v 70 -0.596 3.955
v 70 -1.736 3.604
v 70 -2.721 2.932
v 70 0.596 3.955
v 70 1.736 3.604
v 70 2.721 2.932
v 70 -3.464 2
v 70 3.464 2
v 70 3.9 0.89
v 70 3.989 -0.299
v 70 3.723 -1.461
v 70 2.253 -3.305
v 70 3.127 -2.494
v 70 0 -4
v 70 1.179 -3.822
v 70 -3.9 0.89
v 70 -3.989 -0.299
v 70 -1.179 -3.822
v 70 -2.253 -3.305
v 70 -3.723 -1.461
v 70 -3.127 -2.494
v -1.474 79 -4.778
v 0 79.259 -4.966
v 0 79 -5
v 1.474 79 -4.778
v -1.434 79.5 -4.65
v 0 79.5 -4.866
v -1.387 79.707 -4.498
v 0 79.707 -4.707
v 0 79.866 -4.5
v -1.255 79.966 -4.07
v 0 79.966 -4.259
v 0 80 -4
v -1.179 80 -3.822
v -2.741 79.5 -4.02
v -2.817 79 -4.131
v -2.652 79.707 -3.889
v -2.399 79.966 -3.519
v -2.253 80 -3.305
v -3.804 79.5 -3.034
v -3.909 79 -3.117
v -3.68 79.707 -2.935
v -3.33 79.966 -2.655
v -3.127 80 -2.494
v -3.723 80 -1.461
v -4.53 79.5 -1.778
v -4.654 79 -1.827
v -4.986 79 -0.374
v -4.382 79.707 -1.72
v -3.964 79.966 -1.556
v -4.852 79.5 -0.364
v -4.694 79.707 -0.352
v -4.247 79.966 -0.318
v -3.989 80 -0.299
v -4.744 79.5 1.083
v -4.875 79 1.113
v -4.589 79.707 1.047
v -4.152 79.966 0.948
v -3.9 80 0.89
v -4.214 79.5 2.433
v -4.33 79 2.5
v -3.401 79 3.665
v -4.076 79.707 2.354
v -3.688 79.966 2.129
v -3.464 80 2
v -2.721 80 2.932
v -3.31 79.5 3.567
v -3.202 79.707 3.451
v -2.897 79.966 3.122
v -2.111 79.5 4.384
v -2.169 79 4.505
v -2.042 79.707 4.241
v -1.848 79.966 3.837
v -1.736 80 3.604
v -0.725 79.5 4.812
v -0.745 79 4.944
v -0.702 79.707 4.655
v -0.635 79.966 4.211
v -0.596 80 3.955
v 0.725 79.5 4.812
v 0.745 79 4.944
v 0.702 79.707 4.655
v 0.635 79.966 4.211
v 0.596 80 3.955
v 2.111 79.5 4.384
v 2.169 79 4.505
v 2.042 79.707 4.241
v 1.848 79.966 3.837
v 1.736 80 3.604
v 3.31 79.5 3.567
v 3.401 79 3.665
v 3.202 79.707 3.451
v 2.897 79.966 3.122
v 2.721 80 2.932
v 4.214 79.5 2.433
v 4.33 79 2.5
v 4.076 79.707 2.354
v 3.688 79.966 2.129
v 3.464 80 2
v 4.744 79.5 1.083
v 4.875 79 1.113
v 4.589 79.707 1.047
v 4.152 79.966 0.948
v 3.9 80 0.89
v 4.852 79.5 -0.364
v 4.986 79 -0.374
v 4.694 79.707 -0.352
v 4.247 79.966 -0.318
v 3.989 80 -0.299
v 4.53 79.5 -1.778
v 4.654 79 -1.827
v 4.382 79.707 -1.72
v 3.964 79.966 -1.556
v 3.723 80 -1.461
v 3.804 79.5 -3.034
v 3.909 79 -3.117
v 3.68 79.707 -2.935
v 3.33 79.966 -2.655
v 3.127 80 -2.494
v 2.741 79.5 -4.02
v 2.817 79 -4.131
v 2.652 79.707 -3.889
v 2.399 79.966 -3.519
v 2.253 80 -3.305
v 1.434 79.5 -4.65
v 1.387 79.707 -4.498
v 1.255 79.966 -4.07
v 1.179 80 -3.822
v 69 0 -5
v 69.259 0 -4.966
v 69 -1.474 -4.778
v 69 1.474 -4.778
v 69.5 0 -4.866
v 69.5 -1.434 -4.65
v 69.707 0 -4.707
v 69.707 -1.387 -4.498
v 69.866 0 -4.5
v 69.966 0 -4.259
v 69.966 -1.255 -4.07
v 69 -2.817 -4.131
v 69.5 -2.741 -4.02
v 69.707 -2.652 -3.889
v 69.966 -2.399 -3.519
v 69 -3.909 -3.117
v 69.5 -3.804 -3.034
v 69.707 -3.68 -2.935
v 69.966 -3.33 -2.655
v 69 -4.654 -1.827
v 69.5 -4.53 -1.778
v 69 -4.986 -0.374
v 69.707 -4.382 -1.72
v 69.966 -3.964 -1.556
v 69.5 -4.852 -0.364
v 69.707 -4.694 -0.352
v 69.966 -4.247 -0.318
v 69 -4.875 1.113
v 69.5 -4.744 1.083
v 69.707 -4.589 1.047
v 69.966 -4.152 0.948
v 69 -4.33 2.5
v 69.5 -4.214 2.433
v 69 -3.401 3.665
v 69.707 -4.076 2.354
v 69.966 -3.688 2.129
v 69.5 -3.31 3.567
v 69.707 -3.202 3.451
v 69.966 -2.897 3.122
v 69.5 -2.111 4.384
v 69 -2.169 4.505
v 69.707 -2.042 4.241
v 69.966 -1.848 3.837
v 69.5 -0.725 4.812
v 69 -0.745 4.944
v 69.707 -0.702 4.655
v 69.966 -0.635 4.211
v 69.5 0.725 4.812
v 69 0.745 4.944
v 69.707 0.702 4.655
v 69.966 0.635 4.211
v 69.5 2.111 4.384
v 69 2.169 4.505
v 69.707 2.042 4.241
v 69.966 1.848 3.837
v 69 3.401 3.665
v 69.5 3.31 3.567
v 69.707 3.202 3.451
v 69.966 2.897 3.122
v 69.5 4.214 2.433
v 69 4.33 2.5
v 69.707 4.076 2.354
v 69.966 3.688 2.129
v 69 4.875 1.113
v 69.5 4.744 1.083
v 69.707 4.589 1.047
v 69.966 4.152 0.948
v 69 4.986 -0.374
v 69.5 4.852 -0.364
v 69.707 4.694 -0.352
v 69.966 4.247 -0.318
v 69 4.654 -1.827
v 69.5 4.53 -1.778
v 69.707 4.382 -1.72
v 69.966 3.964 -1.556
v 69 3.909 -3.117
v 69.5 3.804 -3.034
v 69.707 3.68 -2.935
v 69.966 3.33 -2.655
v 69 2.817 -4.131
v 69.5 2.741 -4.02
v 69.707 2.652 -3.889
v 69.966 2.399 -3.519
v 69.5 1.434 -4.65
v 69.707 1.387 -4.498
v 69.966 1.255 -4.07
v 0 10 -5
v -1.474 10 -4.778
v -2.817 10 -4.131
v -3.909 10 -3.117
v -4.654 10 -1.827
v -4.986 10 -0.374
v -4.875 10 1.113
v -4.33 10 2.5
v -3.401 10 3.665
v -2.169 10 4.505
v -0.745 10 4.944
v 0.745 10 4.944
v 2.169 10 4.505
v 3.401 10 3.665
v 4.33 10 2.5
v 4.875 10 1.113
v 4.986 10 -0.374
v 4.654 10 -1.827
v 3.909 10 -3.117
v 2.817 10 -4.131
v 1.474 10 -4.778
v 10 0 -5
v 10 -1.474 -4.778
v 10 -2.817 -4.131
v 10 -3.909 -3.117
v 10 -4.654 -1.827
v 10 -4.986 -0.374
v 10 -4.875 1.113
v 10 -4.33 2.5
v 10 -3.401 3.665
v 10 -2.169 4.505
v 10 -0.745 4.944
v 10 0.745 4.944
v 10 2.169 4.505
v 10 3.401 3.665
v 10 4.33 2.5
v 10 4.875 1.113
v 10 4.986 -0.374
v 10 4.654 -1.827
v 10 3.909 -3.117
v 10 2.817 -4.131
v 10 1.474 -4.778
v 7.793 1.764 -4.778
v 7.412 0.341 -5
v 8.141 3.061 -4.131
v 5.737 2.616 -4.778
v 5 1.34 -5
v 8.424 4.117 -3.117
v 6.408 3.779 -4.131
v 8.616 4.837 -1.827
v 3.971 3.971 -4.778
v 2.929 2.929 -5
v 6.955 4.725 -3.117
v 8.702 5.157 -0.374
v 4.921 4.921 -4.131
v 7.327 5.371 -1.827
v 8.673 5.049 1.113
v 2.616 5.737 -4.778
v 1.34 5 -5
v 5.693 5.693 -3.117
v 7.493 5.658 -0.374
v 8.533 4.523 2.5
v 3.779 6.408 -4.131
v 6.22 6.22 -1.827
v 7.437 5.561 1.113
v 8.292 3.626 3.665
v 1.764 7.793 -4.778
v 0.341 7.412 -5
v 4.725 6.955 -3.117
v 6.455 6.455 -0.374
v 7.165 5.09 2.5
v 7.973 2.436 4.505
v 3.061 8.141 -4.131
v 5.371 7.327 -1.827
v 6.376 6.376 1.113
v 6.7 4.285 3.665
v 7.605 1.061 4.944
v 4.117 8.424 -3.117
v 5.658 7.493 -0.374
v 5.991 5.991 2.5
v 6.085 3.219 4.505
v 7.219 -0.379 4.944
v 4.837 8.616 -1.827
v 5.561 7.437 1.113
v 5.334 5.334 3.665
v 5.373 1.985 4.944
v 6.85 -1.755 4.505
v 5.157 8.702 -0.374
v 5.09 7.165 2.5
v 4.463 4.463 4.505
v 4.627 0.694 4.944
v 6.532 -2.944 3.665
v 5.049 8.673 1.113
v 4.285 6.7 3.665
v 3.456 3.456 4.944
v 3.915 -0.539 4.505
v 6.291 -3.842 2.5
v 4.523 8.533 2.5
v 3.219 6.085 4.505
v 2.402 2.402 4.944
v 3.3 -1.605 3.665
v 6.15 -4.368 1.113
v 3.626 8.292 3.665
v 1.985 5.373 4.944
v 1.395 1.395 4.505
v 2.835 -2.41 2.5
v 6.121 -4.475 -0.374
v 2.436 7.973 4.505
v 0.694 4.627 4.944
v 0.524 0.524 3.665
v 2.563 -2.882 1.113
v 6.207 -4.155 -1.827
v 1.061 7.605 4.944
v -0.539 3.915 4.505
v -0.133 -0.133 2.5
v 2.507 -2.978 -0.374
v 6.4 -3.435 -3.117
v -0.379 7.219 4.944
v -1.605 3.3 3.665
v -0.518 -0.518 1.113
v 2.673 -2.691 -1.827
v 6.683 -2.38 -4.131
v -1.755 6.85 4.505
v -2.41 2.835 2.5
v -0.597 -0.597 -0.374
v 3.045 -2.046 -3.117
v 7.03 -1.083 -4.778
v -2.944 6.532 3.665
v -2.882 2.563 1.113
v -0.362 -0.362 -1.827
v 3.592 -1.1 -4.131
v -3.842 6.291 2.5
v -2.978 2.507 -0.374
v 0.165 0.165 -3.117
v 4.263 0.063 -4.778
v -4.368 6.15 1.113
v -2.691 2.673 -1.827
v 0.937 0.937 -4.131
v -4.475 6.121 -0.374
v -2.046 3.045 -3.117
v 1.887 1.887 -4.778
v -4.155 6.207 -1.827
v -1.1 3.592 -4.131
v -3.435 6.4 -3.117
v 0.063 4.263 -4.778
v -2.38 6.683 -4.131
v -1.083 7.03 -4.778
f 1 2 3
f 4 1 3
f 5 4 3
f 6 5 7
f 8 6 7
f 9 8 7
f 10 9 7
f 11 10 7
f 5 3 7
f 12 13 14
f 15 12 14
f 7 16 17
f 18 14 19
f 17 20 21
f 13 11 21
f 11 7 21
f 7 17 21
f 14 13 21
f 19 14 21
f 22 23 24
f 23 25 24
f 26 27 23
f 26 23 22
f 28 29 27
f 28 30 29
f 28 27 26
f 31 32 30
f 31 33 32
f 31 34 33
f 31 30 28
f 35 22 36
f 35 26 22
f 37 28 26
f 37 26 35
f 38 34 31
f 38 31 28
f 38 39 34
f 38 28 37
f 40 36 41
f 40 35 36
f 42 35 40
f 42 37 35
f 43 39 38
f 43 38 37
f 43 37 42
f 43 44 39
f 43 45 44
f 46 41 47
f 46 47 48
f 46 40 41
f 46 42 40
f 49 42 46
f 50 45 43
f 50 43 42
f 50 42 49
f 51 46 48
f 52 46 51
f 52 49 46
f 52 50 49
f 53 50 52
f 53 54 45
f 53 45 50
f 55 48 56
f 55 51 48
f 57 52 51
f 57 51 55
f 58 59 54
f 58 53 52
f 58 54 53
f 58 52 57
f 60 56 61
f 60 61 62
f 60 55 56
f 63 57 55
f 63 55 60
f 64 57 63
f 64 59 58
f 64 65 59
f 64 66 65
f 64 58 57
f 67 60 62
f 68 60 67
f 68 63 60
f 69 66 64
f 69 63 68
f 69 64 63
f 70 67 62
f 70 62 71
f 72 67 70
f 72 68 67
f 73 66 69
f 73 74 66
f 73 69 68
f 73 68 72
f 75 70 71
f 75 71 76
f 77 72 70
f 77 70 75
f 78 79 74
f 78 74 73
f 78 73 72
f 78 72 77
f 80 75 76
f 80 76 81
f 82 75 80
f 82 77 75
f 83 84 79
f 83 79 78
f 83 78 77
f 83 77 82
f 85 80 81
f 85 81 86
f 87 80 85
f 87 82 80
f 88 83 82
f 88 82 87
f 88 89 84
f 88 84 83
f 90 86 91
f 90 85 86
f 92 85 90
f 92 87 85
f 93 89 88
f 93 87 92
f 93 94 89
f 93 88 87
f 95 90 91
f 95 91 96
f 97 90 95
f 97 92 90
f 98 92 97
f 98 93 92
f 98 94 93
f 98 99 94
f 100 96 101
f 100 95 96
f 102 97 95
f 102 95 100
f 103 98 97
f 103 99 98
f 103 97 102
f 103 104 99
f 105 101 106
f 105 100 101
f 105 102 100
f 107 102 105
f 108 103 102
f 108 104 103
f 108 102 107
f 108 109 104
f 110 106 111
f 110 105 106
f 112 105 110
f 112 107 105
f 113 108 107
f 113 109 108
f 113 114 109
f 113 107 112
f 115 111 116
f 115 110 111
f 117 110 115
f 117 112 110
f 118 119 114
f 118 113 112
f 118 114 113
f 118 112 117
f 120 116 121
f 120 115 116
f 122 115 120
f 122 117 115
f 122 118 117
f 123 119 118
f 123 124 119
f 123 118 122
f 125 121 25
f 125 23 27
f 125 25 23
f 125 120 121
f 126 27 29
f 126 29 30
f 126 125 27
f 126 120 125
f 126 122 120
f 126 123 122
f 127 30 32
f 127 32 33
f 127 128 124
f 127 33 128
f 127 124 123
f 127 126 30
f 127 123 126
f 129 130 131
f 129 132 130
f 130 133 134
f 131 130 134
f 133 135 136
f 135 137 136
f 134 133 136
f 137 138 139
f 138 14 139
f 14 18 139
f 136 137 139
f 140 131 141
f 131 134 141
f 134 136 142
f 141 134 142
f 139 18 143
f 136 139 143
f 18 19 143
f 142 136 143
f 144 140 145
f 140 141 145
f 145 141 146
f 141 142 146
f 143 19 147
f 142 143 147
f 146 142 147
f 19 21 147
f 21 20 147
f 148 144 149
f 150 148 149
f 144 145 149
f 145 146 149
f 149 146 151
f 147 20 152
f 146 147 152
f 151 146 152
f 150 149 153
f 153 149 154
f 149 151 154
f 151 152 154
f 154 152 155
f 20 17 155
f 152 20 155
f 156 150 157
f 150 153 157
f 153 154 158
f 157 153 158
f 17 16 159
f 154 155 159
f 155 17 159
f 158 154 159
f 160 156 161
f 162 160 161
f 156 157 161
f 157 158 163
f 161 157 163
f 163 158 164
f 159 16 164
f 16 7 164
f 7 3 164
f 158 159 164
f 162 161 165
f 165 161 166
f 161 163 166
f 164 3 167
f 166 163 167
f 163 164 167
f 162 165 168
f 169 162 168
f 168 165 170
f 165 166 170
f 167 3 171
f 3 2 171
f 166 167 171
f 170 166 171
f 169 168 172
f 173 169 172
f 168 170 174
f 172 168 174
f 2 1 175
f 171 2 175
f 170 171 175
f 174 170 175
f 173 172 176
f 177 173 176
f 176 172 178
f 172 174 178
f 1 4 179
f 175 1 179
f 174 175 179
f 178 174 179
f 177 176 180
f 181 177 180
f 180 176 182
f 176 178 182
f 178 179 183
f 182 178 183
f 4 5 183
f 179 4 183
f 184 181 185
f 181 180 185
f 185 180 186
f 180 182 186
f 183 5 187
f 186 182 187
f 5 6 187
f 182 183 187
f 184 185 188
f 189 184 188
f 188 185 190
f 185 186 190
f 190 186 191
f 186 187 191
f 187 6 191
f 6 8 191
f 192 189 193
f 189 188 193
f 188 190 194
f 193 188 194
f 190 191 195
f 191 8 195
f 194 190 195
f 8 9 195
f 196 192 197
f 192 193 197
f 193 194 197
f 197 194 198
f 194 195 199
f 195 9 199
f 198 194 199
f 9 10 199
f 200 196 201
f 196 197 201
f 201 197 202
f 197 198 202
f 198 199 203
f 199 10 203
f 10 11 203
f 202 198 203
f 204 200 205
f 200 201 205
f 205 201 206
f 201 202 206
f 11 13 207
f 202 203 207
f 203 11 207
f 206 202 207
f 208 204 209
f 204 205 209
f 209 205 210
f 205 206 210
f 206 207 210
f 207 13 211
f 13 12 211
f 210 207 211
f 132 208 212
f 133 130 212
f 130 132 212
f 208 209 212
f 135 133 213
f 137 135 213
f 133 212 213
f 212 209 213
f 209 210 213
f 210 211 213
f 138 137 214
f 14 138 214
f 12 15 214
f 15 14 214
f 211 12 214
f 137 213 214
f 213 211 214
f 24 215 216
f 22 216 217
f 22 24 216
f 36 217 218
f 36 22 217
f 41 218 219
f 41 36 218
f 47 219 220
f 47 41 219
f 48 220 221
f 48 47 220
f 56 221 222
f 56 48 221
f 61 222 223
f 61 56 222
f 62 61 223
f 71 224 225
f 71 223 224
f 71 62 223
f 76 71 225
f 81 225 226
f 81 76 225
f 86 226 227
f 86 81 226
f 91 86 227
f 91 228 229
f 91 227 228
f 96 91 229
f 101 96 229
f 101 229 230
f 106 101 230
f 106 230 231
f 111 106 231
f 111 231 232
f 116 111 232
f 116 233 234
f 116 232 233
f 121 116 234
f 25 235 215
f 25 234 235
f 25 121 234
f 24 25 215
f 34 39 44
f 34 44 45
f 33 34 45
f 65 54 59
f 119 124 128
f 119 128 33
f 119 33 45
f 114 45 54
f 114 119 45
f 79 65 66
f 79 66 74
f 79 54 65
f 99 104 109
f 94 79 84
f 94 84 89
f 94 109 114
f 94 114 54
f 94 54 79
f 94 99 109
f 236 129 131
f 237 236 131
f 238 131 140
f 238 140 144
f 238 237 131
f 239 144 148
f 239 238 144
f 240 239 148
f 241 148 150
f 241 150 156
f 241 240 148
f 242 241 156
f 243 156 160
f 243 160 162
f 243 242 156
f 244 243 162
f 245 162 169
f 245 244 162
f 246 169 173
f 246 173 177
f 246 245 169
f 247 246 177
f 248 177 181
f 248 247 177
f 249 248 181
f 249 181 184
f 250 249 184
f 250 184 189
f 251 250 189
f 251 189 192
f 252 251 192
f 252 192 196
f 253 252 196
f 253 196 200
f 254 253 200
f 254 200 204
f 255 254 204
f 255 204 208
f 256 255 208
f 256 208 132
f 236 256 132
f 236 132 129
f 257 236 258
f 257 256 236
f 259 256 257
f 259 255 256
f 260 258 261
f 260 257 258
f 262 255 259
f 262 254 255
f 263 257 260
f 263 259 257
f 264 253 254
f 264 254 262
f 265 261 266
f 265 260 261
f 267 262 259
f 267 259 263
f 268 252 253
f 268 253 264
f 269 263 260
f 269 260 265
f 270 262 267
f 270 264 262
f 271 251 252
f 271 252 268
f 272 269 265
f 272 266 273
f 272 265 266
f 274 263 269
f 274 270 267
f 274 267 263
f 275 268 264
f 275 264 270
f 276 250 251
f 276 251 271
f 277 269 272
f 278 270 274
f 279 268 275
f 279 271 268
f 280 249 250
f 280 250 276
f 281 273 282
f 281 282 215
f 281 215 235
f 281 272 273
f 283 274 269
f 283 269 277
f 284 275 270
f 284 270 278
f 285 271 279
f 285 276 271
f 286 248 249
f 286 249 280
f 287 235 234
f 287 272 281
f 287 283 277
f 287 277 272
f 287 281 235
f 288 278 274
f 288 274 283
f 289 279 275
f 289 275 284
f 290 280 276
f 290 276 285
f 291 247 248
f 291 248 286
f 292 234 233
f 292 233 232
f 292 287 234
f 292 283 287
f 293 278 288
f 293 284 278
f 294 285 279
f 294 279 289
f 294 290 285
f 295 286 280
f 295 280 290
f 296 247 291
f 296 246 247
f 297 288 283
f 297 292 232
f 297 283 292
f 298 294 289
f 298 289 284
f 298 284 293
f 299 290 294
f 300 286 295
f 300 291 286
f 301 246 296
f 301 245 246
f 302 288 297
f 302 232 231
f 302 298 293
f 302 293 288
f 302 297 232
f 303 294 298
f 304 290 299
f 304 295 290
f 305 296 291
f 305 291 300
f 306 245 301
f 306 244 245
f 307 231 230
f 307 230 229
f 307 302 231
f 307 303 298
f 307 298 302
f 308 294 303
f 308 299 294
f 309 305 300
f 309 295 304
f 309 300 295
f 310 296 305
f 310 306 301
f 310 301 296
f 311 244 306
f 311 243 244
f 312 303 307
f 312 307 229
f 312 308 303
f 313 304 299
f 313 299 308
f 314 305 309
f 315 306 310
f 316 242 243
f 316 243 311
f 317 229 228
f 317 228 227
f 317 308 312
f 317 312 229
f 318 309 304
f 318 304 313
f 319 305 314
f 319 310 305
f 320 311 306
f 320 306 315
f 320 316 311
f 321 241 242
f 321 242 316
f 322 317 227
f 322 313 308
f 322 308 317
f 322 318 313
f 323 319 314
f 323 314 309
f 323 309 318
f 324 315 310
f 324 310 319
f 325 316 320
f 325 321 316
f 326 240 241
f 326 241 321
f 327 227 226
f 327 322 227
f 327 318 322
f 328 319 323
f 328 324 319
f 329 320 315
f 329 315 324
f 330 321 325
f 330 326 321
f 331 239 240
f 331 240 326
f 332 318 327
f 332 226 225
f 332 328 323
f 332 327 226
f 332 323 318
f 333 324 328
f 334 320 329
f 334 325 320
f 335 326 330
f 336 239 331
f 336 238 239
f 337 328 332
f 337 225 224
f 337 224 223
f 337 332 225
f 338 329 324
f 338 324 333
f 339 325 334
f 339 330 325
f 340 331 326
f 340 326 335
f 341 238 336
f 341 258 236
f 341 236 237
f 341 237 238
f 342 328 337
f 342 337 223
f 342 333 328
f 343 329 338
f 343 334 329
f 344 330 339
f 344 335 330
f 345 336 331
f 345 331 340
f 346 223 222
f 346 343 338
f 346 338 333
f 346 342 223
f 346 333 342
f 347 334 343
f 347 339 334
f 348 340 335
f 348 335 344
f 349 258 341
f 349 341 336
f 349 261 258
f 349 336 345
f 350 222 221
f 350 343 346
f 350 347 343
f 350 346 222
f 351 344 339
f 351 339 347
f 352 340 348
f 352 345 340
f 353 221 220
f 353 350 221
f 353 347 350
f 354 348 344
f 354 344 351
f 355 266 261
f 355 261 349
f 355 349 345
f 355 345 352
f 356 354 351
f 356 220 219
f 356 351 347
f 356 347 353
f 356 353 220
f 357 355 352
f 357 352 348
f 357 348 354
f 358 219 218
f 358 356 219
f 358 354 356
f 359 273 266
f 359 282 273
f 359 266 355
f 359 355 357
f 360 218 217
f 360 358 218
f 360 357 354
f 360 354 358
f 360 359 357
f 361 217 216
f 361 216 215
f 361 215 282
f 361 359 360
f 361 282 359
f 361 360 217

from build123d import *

# Parameters (mm, degrees)
SWEEP1_PROFILE_R = 5
FILLET1_R        = 1


with BuildPart() as part:
    # Sweep1: sweep along a path in Sketch1
    with BuildLine(Plane.XY) as sweep1_path:
        Line((70, 0), (10, 0))
        ThreePointArc((10, 0), (2.928932188, 2.928932188), (0, 10))
        Line((0, 10), (0, 80))
    # Sweep1 profile (on start of the path) → Sweep1 (sweep)
    with BuildSketch(Plane(origin=(70, 0, 0), x_dir=(0, 0, -1), z_dir=(-1, 0, 0))):
        Circle(SWEEP1_PROFILE_R)
    sweep(path=sweep1_path.line)

    # Fillet1
    fillet1_edges = [part.edges().sort_by_distance(p)[0] for p in [
        (0, 80, 5),
        (70, 0, 5),
    ]]
    fillet(fillet1_edges, radius=FILLET1_R)


solid = part.part
